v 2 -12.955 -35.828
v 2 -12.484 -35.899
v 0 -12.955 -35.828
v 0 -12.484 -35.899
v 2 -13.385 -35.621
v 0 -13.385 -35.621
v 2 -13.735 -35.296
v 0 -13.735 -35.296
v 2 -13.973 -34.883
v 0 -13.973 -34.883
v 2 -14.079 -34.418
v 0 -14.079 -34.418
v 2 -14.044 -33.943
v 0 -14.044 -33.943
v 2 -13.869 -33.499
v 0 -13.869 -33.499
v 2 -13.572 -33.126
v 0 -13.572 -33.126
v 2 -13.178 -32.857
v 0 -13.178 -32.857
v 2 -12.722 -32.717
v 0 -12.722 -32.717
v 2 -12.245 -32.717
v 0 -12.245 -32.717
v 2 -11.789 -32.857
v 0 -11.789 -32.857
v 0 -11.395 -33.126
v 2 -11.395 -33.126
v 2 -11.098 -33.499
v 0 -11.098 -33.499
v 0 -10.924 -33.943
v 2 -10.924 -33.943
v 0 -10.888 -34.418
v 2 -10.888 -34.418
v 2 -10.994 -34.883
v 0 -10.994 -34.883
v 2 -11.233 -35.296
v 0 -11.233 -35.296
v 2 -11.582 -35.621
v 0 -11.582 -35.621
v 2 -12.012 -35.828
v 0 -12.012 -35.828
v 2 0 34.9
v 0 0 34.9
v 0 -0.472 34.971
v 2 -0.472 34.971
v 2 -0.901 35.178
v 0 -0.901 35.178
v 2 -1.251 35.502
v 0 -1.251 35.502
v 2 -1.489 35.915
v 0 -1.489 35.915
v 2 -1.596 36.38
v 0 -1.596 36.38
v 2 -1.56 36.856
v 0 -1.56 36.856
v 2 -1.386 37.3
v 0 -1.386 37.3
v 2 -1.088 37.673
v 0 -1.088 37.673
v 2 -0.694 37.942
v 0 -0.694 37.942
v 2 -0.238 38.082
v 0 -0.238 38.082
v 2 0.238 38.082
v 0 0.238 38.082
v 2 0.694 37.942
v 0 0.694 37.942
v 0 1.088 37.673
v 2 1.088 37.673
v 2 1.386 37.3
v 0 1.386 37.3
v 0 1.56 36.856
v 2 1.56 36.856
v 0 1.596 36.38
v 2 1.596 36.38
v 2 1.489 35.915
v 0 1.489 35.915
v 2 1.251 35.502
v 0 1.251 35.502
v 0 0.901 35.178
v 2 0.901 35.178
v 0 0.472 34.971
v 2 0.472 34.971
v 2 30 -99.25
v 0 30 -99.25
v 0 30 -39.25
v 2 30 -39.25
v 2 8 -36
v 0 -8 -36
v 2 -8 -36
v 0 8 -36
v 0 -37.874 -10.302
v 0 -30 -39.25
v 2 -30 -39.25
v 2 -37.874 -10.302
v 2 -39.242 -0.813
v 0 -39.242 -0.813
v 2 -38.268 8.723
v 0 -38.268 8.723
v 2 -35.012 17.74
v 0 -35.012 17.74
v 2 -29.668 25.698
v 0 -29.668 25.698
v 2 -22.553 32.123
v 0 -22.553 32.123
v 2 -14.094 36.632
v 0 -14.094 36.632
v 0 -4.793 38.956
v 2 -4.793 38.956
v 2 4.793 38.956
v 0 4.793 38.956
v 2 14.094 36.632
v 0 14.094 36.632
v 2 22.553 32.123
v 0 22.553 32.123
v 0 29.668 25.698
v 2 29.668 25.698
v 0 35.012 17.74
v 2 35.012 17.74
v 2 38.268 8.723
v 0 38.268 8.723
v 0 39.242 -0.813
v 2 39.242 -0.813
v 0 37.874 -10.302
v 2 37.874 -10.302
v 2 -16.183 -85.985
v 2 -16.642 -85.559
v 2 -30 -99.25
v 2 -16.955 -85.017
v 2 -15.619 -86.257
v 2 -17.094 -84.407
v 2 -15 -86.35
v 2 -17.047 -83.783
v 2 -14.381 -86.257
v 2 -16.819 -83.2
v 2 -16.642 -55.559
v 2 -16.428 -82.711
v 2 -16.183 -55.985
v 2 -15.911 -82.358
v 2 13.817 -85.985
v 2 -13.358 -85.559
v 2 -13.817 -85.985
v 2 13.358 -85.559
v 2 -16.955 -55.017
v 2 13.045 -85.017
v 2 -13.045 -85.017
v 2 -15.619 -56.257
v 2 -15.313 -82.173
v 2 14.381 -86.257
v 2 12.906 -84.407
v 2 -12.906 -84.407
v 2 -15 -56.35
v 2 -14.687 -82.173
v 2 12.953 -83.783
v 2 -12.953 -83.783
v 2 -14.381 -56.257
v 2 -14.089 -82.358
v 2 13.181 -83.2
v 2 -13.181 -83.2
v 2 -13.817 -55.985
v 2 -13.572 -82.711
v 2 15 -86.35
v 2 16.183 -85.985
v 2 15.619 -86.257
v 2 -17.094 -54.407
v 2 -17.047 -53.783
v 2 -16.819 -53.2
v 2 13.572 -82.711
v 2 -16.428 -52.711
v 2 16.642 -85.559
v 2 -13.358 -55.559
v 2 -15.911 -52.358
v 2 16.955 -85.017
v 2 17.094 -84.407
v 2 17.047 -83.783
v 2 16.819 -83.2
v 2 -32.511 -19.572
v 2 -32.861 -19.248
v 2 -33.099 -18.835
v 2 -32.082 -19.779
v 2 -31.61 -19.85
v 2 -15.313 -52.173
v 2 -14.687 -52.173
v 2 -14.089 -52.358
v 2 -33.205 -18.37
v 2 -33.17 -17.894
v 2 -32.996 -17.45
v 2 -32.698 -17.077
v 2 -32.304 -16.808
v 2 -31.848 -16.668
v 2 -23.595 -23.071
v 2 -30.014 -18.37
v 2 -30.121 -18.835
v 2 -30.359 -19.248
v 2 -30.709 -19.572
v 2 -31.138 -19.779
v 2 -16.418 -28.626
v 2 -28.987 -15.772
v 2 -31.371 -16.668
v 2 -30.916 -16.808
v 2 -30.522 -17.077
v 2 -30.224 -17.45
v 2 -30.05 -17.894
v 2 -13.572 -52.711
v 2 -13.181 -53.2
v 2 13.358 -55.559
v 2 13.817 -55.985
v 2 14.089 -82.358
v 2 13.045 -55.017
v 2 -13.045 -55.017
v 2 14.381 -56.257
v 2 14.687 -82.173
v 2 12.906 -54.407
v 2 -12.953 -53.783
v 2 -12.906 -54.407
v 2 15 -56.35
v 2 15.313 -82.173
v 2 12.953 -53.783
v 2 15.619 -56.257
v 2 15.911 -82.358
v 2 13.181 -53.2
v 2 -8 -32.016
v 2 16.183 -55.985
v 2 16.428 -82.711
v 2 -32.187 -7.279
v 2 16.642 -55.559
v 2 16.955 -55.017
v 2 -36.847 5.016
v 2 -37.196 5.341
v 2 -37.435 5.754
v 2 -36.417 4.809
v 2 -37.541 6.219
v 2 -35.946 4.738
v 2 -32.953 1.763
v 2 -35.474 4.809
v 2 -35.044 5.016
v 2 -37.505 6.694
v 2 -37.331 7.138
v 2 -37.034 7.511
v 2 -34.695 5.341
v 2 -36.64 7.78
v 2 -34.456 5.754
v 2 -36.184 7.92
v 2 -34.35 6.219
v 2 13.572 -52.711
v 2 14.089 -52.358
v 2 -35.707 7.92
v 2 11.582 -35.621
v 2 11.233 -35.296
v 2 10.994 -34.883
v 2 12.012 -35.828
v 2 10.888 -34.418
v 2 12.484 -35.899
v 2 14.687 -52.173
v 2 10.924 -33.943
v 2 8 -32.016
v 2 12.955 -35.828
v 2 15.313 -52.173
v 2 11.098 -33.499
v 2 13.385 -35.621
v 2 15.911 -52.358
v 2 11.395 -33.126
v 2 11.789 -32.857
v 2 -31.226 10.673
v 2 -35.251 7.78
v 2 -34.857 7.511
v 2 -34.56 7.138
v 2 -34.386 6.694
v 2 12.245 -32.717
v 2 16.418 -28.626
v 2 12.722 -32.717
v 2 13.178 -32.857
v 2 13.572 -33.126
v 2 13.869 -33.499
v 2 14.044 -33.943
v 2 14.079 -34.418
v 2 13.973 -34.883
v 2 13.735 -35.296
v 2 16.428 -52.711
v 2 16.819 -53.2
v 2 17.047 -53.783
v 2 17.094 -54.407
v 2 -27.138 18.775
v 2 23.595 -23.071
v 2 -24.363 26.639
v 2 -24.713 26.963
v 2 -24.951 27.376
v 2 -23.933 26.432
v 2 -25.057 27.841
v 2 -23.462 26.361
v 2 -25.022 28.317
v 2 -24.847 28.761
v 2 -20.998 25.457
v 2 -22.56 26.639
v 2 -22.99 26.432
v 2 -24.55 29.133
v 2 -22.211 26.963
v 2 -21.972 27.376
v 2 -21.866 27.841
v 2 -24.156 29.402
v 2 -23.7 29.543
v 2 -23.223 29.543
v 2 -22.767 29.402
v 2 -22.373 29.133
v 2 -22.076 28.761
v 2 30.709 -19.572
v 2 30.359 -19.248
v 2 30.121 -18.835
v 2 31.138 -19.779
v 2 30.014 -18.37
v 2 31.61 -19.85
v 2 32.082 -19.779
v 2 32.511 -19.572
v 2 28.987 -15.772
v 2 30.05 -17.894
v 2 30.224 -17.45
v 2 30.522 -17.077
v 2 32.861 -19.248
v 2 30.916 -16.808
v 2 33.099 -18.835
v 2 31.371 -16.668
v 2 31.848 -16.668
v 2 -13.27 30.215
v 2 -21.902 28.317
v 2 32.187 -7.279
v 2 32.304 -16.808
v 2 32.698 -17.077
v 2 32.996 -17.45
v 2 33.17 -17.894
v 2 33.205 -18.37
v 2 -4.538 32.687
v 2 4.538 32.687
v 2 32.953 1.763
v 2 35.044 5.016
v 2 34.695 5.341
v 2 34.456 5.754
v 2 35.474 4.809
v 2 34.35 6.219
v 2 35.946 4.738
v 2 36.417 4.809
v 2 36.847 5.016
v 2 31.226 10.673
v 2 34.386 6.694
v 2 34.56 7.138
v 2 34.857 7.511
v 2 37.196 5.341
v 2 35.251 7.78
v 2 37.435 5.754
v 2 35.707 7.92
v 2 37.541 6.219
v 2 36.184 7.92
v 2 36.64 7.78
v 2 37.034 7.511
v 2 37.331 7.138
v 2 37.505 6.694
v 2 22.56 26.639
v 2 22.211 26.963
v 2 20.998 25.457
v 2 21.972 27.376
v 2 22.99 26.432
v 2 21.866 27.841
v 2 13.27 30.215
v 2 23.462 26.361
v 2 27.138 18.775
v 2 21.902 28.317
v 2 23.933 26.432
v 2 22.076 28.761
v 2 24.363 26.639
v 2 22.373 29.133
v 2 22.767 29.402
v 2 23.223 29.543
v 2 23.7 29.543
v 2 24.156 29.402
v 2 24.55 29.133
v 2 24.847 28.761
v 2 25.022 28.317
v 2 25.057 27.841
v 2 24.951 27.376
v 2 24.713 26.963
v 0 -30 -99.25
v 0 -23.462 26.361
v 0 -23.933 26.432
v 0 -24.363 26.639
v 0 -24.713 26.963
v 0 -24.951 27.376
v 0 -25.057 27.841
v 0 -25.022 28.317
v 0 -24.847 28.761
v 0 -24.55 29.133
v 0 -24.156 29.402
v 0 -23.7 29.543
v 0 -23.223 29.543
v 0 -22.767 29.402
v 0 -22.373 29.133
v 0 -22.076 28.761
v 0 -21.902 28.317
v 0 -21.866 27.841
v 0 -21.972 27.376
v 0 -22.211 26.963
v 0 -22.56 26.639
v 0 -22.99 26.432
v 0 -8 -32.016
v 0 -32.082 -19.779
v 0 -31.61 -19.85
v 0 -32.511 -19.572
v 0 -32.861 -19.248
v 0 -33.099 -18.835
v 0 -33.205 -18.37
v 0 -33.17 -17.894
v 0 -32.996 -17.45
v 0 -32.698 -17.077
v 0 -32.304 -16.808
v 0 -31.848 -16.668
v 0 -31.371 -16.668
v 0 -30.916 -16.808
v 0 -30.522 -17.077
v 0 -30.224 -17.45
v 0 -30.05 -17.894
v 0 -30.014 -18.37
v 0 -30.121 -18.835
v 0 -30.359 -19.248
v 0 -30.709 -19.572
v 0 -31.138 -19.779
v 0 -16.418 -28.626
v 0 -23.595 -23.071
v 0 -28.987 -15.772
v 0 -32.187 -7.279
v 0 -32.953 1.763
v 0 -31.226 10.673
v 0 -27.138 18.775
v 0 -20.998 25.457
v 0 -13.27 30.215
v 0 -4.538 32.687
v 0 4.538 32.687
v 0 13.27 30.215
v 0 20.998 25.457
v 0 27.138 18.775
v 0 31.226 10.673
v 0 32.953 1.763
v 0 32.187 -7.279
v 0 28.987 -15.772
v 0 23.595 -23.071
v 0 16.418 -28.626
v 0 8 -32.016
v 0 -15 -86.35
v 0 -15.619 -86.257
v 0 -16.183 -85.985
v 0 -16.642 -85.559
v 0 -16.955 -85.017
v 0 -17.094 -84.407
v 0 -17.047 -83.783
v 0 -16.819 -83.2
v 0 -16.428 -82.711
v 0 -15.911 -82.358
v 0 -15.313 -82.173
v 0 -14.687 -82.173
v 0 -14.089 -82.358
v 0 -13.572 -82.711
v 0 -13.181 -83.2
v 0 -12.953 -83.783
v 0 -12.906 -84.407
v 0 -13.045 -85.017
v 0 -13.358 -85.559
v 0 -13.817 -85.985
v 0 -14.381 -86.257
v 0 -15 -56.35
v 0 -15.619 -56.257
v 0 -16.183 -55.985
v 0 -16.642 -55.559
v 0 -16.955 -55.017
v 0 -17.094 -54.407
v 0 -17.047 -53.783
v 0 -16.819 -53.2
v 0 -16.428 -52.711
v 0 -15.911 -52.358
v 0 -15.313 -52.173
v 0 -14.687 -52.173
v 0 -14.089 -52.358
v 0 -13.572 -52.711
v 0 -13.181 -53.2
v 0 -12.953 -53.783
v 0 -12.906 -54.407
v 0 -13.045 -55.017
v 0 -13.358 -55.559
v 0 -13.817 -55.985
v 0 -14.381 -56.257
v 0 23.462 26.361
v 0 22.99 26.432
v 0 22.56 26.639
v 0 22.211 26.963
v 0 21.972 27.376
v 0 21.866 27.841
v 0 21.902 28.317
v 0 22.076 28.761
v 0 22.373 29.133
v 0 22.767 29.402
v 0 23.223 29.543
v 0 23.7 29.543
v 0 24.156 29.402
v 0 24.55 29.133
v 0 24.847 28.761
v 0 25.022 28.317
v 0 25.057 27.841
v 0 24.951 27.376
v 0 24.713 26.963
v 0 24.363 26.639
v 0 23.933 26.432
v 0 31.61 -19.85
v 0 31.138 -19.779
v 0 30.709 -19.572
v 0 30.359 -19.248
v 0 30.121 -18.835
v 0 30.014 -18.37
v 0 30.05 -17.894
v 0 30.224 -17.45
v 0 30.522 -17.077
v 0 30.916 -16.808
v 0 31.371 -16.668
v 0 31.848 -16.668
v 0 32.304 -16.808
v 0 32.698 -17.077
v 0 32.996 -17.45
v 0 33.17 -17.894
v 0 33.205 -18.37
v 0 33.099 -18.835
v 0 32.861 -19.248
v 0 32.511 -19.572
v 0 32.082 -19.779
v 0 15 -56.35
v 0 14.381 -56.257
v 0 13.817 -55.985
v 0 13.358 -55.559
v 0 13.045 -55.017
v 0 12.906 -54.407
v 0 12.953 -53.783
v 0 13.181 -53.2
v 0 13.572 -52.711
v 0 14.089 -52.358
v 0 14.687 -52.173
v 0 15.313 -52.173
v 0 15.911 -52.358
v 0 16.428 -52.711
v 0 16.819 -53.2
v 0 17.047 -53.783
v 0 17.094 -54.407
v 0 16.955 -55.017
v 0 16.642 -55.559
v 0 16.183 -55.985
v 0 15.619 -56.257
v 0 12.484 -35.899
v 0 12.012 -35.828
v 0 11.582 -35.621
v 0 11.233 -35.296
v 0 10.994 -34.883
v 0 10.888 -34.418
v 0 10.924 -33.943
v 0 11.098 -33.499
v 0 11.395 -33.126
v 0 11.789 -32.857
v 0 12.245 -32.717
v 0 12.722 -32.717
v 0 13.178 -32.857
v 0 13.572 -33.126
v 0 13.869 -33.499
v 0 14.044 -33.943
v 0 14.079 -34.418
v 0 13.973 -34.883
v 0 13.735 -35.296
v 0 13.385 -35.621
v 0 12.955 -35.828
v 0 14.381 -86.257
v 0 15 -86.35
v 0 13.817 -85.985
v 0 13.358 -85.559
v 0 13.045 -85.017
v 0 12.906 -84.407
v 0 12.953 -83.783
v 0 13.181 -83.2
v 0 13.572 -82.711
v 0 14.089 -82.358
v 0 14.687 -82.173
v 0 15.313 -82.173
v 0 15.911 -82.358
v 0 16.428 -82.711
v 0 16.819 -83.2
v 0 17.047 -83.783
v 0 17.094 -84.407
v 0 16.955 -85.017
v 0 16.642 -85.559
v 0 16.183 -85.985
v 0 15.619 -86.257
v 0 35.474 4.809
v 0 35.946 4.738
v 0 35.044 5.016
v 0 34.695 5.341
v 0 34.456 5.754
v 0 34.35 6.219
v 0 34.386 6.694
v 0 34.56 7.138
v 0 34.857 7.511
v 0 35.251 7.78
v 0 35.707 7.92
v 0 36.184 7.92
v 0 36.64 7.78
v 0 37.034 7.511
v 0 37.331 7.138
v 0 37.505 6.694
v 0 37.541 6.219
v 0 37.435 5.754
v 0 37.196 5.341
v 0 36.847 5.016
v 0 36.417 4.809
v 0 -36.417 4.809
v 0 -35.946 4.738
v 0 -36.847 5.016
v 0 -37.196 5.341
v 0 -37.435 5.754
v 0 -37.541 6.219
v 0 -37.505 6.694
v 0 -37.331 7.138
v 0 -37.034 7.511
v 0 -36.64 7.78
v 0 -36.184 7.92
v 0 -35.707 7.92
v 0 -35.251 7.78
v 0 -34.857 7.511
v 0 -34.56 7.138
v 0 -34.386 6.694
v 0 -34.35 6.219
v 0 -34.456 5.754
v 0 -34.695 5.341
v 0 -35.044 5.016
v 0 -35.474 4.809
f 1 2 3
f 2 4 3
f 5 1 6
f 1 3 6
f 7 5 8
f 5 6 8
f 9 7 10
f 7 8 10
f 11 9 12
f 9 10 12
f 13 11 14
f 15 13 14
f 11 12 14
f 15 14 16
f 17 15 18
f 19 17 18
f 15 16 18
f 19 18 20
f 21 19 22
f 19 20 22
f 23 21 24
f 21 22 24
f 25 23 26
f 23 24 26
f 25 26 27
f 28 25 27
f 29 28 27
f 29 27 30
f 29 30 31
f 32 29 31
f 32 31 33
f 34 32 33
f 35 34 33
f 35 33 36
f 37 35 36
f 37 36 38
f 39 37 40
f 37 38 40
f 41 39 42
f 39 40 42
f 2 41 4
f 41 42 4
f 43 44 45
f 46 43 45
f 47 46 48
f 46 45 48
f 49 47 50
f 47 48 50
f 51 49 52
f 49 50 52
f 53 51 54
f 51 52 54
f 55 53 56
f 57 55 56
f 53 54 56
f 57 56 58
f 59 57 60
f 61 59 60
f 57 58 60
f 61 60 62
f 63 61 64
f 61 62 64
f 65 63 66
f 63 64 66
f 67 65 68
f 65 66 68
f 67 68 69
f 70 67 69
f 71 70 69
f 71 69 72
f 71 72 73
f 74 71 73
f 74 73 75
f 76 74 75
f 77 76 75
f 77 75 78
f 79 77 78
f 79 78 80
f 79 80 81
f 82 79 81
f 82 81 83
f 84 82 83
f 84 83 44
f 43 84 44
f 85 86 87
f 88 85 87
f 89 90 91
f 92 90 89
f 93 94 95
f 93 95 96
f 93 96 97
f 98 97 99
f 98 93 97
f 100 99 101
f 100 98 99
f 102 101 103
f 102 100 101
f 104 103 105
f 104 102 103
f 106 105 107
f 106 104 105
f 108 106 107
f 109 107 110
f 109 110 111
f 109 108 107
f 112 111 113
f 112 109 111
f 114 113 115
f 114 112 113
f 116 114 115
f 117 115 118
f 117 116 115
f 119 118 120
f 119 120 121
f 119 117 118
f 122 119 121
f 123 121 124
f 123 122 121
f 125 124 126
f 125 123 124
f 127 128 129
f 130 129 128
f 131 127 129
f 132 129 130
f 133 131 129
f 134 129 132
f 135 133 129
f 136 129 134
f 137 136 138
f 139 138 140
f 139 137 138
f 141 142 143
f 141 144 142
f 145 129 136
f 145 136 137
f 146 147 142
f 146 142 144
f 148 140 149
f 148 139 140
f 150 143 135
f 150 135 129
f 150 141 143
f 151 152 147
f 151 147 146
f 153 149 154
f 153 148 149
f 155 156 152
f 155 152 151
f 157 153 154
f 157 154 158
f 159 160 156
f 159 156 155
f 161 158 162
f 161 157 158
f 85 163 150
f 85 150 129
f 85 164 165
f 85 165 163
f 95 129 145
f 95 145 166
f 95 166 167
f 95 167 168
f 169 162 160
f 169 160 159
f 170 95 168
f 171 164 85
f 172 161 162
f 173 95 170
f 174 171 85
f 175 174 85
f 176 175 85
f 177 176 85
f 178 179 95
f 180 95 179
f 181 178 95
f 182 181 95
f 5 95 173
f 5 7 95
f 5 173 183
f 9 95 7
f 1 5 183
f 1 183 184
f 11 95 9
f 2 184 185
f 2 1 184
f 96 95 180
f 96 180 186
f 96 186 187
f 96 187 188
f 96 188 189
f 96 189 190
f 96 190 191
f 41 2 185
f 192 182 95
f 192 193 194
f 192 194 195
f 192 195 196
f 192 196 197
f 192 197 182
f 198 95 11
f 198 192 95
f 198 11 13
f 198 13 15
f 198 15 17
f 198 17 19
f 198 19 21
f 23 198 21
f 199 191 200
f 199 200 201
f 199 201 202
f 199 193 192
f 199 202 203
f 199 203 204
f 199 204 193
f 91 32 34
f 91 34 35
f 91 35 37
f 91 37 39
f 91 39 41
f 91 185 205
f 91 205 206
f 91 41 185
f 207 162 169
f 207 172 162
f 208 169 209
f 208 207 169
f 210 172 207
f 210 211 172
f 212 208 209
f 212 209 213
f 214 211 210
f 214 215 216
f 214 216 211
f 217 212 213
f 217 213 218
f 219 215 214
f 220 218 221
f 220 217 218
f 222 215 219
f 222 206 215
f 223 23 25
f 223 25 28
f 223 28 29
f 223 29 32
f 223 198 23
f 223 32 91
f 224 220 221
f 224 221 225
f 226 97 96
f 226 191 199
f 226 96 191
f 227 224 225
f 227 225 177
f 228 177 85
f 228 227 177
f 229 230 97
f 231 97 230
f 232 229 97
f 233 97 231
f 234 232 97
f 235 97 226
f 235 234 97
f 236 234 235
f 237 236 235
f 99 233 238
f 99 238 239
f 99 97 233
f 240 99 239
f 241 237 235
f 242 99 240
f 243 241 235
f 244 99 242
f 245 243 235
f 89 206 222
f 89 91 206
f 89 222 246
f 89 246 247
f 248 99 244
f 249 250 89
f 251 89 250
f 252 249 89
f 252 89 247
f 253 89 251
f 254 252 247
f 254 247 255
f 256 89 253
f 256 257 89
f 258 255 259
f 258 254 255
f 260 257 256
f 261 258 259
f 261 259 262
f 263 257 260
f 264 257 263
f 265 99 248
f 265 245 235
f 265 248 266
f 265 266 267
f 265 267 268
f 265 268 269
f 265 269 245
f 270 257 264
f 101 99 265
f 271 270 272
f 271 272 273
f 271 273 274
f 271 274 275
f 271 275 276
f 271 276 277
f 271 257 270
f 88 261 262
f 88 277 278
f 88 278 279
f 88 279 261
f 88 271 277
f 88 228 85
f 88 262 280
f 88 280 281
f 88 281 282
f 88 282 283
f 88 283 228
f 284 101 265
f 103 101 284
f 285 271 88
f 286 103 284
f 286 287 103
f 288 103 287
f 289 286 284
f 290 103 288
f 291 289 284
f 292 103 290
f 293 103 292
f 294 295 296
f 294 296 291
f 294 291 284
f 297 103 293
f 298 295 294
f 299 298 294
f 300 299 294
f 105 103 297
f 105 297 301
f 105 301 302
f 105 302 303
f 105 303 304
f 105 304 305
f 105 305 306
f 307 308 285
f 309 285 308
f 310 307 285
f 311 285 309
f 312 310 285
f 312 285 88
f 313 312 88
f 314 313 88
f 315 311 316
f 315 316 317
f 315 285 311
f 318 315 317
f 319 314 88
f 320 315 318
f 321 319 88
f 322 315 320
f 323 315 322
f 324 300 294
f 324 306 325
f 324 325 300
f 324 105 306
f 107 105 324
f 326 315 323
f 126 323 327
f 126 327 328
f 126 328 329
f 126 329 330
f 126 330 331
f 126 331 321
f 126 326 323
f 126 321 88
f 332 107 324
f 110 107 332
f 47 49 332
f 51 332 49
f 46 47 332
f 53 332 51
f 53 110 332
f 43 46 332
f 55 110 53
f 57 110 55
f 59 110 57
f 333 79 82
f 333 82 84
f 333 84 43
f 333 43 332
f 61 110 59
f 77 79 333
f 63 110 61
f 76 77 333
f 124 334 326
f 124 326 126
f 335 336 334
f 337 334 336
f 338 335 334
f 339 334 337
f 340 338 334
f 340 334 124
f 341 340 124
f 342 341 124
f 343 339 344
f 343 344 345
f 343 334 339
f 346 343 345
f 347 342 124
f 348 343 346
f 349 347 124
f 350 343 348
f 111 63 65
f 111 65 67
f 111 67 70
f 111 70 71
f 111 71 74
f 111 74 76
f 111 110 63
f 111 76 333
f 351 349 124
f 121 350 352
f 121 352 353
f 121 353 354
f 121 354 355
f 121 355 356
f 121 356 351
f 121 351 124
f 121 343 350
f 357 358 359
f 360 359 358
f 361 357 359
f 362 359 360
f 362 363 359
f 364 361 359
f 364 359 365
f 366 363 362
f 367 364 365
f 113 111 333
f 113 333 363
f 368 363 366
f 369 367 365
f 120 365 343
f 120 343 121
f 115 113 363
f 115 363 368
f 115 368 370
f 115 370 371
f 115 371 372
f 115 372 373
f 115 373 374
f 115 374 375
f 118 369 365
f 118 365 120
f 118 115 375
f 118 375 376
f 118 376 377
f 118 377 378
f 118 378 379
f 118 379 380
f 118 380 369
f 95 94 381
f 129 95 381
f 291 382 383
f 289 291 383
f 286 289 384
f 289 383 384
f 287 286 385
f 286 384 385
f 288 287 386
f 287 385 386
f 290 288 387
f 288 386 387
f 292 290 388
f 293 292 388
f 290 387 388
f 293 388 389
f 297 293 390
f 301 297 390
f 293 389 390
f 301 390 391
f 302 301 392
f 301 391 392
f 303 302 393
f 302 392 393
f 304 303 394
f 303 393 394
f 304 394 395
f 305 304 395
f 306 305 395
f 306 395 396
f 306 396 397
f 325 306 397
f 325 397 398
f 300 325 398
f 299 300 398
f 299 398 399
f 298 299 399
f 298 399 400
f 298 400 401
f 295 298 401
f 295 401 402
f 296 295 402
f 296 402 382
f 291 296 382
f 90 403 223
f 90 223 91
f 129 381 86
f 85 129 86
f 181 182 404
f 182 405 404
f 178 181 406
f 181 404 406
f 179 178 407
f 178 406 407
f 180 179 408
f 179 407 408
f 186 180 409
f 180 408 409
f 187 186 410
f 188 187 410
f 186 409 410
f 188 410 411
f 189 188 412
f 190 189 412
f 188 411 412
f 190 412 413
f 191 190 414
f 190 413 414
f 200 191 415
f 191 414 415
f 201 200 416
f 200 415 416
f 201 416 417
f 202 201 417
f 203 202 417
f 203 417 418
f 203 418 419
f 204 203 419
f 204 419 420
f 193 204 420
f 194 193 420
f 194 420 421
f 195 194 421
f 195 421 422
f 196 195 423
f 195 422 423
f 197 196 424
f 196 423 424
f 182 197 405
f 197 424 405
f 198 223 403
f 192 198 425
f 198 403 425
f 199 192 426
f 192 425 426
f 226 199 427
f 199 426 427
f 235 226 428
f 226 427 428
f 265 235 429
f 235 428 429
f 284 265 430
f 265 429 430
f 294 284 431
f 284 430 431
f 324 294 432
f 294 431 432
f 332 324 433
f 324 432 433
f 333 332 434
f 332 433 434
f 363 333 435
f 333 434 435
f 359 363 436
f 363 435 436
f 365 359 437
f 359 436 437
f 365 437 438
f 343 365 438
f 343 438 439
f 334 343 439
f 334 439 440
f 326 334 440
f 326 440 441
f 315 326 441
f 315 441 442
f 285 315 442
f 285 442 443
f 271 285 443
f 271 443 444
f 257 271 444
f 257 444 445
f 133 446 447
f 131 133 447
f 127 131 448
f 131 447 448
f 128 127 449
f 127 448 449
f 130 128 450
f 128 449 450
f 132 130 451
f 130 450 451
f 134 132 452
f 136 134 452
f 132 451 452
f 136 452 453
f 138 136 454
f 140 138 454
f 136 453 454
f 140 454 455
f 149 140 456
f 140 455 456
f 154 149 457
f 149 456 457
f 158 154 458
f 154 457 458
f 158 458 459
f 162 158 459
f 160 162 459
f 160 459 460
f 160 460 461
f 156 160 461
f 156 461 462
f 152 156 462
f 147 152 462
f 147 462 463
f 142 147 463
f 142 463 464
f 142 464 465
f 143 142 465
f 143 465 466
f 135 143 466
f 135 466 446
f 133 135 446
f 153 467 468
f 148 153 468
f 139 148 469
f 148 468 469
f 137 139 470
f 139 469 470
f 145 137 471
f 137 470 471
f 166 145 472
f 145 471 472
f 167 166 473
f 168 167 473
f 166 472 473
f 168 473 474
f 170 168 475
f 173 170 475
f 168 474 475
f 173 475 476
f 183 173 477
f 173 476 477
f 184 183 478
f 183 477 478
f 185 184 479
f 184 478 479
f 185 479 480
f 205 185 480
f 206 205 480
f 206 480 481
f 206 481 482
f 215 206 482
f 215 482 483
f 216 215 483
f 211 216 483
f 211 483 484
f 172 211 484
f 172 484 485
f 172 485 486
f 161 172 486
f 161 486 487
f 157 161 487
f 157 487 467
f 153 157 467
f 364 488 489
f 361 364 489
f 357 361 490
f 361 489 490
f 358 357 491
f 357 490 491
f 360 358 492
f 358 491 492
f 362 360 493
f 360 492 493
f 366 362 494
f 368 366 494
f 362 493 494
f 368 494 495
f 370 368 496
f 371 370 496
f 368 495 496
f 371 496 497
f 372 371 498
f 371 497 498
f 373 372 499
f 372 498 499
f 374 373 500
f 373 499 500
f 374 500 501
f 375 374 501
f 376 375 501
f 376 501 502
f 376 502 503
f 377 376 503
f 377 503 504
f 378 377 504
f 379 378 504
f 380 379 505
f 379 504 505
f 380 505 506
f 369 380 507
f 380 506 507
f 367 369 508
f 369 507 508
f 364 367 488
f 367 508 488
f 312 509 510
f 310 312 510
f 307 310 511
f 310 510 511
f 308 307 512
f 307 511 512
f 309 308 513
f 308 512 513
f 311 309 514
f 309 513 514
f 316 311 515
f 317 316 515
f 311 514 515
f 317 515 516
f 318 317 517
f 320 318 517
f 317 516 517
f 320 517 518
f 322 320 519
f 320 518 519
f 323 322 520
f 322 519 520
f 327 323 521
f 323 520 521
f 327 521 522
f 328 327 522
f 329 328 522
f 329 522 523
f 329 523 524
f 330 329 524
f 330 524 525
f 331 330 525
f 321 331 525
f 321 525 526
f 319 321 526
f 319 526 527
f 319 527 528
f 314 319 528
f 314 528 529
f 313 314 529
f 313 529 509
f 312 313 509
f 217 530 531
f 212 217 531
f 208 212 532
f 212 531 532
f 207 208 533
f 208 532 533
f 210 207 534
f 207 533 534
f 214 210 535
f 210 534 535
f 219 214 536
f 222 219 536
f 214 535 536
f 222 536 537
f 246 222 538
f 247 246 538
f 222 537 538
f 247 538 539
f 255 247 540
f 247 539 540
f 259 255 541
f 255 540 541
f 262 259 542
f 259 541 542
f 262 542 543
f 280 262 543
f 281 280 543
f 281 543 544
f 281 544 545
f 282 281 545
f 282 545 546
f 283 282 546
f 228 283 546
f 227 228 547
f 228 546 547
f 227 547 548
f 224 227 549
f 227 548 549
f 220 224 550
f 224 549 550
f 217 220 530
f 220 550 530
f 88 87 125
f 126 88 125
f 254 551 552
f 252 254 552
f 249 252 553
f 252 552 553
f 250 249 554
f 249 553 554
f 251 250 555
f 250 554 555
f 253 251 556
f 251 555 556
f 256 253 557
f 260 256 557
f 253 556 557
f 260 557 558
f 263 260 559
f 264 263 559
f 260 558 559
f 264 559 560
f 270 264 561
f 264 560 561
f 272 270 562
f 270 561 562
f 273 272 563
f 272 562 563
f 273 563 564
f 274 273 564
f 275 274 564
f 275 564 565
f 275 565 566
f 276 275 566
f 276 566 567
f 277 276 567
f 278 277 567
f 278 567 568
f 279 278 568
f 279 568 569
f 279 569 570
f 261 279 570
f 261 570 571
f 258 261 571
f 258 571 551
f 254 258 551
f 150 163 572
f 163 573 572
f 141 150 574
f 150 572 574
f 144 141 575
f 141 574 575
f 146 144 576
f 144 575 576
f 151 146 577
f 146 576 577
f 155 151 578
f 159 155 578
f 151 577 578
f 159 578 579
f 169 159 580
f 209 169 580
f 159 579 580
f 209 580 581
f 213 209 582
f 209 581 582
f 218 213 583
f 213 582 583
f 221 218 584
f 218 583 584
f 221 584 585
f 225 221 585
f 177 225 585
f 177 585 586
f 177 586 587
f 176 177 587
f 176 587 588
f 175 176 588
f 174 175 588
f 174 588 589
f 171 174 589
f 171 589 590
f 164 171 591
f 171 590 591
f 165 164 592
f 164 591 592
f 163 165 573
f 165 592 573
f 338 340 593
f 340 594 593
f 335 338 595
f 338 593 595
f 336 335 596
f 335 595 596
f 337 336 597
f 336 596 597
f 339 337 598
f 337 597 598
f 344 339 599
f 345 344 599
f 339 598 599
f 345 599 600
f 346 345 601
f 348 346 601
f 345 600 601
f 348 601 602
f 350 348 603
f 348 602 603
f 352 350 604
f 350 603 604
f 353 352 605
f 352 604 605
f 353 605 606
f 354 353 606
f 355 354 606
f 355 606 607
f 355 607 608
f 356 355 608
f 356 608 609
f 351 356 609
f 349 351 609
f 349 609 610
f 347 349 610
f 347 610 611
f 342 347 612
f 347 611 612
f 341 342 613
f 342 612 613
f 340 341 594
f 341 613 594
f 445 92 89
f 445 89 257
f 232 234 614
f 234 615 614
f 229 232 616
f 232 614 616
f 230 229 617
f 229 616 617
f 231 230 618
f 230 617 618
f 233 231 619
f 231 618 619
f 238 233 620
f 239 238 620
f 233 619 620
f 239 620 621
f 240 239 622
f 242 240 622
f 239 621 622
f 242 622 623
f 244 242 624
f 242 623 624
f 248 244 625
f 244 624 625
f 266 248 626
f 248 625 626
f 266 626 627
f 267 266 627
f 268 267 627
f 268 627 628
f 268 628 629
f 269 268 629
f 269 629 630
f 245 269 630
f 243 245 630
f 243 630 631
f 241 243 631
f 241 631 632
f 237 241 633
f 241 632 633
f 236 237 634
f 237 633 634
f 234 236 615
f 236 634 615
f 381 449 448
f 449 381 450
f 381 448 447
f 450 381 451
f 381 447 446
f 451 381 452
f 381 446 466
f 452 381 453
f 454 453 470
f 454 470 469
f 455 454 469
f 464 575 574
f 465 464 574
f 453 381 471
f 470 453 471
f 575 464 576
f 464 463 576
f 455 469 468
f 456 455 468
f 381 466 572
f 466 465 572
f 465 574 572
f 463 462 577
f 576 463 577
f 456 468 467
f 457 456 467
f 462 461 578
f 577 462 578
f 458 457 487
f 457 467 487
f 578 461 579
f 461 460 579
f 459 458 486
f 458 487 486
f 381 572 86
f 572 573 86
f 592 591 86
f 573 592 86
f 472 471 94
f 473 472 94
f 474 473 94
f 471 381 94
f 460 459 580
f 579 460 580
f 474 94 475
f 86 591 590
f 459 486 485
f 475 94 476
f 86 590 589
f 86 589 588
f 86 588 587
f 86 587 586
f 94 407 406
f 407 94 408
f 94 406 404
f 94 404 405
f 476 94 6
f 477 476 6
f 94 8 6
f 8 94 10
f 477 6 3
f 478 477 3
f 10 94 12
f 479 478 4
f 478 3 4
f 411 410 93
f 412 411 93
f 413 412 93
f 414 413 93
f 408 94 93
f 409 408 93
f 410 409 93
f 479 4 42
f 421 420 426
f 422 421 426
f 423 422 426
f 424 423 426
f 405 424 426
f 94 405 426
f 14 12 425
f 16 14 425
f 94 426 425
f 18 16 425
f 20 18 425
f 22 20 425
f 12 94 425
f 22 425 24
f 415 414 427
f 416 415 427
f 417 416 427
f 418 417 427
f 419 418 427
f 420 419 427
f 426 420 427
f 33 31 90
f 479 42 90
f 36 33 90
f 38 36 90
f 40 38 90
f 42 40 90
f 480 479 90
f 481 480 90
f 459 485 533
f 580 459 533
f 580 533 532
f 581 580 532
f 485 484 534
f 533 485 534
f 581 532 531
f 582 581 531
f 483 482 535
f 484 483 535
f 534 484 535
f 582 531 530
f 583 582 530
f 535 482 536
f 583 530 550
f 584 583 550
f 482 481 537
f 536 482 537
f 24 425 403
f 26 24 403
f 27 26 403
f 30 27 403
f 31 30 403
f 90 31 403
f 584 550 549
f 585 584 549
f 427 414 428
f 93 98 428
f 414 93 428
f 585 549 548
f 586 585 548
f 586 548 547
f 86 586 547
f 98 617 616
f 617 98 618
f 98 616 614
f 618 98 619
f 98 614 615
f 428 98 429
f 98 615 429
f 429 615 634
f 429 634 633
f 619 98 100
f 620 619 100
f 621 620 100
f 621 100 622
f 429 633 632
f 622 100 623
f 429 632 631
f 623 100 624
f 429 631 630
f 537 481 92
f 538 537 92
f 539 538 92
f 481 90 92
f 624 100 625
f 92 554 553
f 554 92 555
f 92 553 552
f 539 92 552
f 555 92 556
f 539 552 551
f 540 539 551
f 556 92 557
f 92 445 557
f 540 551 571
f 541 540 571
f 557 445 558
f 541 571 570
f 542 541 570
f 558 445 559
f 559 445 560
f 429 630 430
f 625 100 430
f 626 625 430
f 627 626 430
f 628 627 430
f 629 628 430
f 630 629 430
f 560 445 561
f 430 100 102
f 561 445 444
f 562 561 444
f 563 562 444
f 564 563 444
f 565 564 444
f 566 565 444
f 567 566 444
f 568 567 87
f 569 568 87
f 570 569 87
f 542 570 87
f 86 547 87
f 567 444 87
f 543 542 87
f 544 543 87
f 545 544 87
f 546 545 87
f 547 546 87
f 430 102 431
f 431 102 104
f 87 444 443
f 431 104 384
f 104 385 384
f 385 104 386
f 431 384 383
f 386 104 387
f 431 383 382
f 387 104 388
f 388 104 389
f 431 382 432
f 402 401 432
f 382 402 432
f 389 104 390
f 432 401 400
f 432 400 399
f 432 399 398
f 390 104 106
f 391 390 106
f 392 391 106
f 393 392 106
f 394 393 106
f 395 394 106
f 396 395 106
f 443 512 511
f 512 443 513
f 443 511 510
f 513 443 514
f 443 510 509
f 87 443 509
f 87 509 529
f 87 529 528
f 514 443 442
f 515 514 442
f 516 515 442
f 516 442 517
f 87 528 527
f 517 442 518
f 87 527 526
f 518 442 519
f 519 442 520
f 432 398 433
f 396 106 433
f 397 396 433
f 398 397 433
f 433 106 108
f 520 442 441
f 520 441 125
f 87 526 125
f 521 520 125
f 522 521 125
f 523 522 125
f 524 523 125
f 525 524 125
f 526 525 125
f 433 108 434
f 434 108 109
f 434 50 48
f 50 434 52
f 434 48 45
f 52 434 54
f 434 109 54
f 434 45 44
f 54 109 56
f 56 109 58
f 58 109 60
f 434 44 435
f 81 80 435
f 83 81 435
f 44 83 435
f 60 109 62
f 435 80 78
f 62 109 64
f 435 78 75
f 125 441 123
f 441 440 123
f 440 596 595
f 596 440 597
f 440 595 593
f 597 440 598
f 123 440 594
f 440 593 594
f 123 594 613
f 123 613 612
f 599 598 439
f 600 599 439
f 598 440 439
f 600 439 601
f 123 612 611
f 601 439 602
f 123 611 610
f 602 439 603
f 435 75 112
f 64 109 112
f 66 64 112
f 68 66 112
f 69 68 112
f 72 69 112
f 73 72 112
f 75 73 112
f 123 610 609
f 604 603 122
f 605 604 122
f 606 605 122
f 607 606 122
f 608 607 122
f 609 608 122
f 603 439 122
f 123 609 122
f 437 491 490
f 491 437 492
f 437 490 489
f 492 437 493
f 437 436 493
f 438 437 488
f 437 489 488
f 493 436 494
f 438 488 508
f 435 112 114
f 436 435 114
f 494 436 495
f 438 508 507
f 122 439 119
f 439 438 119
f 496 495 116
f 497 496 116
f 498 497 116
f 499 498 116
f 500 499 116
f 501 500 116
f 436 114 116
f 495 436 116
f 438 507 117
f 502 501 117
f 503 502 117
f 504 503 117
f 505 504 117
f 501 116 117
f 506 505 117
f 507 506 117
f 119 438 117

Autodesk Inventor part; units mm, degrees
ref_plane "YZ Plane" through (0, 0, 0) normal (1, 0, 0) x (0, 1, 0)
ref_plane "XZ Plane" through (0, 0, 0) normal (0, 1, 0) x (-1, 0, 0)
ref_plane "XY Plane" through (0, 0, 0) normal (0, 0, 1) x (1, 0, 0)
sketch "スケッチ1" plane through (0, 0, 0) normal (1, 0, 0) x (0, 1, 0)
  circle A0 centre (0, 0) radius 39.25
  circle A1 centre (0, 0) radius 33
  line L0 (8, 0) -> (-8, 0)
  line L1 (-8, 0) -> (-8, -36)
  line L2 (-8, -36) -> (8, -36)
  line L3 (8, -36) -> (8, 0)
  line L4 (30, -39.25) -> (-30, -39.25)
  line L5 (-30, -39.25) -> (-30, -99.25)
  line L6 (-30, -99.25) -> (30, -99.25)
  line L7 (30, -99.25) -> (30, -39.25)
  line L8 (30, -39.25) -> (37.874, -10.3018)
  line L9 (-30, -39.25) -> (-37.874, -10.3018)
  point P0 (8, 32.0156)
  point P1 (8, -32.0156)
  point P2 (-8, -32.0156)
  point P3 (-8, 32.0156)
  point P4 (0, -39.25)
  dimension "d0" = 78.5
  dimension "d1" = 66
  dimension "d2" = 16
  dimension "d3" = 36
  dimension "d4" = 8
  dimension "d5" = 0
  dimension "d6" = 60
  dimension "d7" = 60
  dimension "d8" = 30
  dimension "d9" = 39.25
extrude "押し出し1" add sketch "スケッチ1" along normal blind 2
sketch "スケッチ2" plane through (2, 0, 0) normal (1, 0, 0) x (0, 0, -1)
  circle A0 centre (0, 0) radius 36.5
  point P0 (-36.5, 0)
  point P1 (-27.9606, -23.4617)
  point P2 (-6.3382, -35.9455)
  point P3 (18.25, -31.6099)
  point P4 (34.2988, -12.4837)
  point P5 (34.2988, 12.4837)
  point P6 (18.25, 31.6099)
  point P7 (-6.3382, 35.9455)
  point P8 (-27.9606, 23.4617)
  dimension "d12" = 73
  dimension "d15" = 360
hole "穴1" at (2, 0, 36.5) at (2, -23.4617, 27.9606) at (2, -35.9455, 6.3382) at (2, -31.6099, -18.25) at (2, -12.4837, -34.2988) at (2, 12.4837, -34.2988) at (2, 31.6099, -18.25) at (2, 35.9455, 6.3382) at (2, 23.4617, 27.9606) direction (-1, 0, 0) diameter 3.2 end through all
sketch "スケッチ3" plane through (2, 0, 0) normal (1, 0, 0) x (0, 0, -1)
  line L0 (54.25, 15) -> (84.25, 15)
  line L1 (84.25, 15) -> (84.25, -15)
  line L2 (84.25, -15) -> (54.25, -15)
  line L3 (54.25, -15) -> (54.25, 15)
  line L4 (99.25, -30) -> (99.25, 30) projected
  point P0 (0, 0)
  dimension "d24" = 30
  dimension "d25" = 30
  dimension "d26" = 15
  dimension "d27" = 15
hole "穴2" at (2, 15, -54.25) at (2, -15, -54.25) at (2, 15, -84.25) at (2, -15, -84.25) direction (-1, 0, 0) diameter 4.2 end through all
properties part number "link3_plate2" material "アルミニウム 6061"
